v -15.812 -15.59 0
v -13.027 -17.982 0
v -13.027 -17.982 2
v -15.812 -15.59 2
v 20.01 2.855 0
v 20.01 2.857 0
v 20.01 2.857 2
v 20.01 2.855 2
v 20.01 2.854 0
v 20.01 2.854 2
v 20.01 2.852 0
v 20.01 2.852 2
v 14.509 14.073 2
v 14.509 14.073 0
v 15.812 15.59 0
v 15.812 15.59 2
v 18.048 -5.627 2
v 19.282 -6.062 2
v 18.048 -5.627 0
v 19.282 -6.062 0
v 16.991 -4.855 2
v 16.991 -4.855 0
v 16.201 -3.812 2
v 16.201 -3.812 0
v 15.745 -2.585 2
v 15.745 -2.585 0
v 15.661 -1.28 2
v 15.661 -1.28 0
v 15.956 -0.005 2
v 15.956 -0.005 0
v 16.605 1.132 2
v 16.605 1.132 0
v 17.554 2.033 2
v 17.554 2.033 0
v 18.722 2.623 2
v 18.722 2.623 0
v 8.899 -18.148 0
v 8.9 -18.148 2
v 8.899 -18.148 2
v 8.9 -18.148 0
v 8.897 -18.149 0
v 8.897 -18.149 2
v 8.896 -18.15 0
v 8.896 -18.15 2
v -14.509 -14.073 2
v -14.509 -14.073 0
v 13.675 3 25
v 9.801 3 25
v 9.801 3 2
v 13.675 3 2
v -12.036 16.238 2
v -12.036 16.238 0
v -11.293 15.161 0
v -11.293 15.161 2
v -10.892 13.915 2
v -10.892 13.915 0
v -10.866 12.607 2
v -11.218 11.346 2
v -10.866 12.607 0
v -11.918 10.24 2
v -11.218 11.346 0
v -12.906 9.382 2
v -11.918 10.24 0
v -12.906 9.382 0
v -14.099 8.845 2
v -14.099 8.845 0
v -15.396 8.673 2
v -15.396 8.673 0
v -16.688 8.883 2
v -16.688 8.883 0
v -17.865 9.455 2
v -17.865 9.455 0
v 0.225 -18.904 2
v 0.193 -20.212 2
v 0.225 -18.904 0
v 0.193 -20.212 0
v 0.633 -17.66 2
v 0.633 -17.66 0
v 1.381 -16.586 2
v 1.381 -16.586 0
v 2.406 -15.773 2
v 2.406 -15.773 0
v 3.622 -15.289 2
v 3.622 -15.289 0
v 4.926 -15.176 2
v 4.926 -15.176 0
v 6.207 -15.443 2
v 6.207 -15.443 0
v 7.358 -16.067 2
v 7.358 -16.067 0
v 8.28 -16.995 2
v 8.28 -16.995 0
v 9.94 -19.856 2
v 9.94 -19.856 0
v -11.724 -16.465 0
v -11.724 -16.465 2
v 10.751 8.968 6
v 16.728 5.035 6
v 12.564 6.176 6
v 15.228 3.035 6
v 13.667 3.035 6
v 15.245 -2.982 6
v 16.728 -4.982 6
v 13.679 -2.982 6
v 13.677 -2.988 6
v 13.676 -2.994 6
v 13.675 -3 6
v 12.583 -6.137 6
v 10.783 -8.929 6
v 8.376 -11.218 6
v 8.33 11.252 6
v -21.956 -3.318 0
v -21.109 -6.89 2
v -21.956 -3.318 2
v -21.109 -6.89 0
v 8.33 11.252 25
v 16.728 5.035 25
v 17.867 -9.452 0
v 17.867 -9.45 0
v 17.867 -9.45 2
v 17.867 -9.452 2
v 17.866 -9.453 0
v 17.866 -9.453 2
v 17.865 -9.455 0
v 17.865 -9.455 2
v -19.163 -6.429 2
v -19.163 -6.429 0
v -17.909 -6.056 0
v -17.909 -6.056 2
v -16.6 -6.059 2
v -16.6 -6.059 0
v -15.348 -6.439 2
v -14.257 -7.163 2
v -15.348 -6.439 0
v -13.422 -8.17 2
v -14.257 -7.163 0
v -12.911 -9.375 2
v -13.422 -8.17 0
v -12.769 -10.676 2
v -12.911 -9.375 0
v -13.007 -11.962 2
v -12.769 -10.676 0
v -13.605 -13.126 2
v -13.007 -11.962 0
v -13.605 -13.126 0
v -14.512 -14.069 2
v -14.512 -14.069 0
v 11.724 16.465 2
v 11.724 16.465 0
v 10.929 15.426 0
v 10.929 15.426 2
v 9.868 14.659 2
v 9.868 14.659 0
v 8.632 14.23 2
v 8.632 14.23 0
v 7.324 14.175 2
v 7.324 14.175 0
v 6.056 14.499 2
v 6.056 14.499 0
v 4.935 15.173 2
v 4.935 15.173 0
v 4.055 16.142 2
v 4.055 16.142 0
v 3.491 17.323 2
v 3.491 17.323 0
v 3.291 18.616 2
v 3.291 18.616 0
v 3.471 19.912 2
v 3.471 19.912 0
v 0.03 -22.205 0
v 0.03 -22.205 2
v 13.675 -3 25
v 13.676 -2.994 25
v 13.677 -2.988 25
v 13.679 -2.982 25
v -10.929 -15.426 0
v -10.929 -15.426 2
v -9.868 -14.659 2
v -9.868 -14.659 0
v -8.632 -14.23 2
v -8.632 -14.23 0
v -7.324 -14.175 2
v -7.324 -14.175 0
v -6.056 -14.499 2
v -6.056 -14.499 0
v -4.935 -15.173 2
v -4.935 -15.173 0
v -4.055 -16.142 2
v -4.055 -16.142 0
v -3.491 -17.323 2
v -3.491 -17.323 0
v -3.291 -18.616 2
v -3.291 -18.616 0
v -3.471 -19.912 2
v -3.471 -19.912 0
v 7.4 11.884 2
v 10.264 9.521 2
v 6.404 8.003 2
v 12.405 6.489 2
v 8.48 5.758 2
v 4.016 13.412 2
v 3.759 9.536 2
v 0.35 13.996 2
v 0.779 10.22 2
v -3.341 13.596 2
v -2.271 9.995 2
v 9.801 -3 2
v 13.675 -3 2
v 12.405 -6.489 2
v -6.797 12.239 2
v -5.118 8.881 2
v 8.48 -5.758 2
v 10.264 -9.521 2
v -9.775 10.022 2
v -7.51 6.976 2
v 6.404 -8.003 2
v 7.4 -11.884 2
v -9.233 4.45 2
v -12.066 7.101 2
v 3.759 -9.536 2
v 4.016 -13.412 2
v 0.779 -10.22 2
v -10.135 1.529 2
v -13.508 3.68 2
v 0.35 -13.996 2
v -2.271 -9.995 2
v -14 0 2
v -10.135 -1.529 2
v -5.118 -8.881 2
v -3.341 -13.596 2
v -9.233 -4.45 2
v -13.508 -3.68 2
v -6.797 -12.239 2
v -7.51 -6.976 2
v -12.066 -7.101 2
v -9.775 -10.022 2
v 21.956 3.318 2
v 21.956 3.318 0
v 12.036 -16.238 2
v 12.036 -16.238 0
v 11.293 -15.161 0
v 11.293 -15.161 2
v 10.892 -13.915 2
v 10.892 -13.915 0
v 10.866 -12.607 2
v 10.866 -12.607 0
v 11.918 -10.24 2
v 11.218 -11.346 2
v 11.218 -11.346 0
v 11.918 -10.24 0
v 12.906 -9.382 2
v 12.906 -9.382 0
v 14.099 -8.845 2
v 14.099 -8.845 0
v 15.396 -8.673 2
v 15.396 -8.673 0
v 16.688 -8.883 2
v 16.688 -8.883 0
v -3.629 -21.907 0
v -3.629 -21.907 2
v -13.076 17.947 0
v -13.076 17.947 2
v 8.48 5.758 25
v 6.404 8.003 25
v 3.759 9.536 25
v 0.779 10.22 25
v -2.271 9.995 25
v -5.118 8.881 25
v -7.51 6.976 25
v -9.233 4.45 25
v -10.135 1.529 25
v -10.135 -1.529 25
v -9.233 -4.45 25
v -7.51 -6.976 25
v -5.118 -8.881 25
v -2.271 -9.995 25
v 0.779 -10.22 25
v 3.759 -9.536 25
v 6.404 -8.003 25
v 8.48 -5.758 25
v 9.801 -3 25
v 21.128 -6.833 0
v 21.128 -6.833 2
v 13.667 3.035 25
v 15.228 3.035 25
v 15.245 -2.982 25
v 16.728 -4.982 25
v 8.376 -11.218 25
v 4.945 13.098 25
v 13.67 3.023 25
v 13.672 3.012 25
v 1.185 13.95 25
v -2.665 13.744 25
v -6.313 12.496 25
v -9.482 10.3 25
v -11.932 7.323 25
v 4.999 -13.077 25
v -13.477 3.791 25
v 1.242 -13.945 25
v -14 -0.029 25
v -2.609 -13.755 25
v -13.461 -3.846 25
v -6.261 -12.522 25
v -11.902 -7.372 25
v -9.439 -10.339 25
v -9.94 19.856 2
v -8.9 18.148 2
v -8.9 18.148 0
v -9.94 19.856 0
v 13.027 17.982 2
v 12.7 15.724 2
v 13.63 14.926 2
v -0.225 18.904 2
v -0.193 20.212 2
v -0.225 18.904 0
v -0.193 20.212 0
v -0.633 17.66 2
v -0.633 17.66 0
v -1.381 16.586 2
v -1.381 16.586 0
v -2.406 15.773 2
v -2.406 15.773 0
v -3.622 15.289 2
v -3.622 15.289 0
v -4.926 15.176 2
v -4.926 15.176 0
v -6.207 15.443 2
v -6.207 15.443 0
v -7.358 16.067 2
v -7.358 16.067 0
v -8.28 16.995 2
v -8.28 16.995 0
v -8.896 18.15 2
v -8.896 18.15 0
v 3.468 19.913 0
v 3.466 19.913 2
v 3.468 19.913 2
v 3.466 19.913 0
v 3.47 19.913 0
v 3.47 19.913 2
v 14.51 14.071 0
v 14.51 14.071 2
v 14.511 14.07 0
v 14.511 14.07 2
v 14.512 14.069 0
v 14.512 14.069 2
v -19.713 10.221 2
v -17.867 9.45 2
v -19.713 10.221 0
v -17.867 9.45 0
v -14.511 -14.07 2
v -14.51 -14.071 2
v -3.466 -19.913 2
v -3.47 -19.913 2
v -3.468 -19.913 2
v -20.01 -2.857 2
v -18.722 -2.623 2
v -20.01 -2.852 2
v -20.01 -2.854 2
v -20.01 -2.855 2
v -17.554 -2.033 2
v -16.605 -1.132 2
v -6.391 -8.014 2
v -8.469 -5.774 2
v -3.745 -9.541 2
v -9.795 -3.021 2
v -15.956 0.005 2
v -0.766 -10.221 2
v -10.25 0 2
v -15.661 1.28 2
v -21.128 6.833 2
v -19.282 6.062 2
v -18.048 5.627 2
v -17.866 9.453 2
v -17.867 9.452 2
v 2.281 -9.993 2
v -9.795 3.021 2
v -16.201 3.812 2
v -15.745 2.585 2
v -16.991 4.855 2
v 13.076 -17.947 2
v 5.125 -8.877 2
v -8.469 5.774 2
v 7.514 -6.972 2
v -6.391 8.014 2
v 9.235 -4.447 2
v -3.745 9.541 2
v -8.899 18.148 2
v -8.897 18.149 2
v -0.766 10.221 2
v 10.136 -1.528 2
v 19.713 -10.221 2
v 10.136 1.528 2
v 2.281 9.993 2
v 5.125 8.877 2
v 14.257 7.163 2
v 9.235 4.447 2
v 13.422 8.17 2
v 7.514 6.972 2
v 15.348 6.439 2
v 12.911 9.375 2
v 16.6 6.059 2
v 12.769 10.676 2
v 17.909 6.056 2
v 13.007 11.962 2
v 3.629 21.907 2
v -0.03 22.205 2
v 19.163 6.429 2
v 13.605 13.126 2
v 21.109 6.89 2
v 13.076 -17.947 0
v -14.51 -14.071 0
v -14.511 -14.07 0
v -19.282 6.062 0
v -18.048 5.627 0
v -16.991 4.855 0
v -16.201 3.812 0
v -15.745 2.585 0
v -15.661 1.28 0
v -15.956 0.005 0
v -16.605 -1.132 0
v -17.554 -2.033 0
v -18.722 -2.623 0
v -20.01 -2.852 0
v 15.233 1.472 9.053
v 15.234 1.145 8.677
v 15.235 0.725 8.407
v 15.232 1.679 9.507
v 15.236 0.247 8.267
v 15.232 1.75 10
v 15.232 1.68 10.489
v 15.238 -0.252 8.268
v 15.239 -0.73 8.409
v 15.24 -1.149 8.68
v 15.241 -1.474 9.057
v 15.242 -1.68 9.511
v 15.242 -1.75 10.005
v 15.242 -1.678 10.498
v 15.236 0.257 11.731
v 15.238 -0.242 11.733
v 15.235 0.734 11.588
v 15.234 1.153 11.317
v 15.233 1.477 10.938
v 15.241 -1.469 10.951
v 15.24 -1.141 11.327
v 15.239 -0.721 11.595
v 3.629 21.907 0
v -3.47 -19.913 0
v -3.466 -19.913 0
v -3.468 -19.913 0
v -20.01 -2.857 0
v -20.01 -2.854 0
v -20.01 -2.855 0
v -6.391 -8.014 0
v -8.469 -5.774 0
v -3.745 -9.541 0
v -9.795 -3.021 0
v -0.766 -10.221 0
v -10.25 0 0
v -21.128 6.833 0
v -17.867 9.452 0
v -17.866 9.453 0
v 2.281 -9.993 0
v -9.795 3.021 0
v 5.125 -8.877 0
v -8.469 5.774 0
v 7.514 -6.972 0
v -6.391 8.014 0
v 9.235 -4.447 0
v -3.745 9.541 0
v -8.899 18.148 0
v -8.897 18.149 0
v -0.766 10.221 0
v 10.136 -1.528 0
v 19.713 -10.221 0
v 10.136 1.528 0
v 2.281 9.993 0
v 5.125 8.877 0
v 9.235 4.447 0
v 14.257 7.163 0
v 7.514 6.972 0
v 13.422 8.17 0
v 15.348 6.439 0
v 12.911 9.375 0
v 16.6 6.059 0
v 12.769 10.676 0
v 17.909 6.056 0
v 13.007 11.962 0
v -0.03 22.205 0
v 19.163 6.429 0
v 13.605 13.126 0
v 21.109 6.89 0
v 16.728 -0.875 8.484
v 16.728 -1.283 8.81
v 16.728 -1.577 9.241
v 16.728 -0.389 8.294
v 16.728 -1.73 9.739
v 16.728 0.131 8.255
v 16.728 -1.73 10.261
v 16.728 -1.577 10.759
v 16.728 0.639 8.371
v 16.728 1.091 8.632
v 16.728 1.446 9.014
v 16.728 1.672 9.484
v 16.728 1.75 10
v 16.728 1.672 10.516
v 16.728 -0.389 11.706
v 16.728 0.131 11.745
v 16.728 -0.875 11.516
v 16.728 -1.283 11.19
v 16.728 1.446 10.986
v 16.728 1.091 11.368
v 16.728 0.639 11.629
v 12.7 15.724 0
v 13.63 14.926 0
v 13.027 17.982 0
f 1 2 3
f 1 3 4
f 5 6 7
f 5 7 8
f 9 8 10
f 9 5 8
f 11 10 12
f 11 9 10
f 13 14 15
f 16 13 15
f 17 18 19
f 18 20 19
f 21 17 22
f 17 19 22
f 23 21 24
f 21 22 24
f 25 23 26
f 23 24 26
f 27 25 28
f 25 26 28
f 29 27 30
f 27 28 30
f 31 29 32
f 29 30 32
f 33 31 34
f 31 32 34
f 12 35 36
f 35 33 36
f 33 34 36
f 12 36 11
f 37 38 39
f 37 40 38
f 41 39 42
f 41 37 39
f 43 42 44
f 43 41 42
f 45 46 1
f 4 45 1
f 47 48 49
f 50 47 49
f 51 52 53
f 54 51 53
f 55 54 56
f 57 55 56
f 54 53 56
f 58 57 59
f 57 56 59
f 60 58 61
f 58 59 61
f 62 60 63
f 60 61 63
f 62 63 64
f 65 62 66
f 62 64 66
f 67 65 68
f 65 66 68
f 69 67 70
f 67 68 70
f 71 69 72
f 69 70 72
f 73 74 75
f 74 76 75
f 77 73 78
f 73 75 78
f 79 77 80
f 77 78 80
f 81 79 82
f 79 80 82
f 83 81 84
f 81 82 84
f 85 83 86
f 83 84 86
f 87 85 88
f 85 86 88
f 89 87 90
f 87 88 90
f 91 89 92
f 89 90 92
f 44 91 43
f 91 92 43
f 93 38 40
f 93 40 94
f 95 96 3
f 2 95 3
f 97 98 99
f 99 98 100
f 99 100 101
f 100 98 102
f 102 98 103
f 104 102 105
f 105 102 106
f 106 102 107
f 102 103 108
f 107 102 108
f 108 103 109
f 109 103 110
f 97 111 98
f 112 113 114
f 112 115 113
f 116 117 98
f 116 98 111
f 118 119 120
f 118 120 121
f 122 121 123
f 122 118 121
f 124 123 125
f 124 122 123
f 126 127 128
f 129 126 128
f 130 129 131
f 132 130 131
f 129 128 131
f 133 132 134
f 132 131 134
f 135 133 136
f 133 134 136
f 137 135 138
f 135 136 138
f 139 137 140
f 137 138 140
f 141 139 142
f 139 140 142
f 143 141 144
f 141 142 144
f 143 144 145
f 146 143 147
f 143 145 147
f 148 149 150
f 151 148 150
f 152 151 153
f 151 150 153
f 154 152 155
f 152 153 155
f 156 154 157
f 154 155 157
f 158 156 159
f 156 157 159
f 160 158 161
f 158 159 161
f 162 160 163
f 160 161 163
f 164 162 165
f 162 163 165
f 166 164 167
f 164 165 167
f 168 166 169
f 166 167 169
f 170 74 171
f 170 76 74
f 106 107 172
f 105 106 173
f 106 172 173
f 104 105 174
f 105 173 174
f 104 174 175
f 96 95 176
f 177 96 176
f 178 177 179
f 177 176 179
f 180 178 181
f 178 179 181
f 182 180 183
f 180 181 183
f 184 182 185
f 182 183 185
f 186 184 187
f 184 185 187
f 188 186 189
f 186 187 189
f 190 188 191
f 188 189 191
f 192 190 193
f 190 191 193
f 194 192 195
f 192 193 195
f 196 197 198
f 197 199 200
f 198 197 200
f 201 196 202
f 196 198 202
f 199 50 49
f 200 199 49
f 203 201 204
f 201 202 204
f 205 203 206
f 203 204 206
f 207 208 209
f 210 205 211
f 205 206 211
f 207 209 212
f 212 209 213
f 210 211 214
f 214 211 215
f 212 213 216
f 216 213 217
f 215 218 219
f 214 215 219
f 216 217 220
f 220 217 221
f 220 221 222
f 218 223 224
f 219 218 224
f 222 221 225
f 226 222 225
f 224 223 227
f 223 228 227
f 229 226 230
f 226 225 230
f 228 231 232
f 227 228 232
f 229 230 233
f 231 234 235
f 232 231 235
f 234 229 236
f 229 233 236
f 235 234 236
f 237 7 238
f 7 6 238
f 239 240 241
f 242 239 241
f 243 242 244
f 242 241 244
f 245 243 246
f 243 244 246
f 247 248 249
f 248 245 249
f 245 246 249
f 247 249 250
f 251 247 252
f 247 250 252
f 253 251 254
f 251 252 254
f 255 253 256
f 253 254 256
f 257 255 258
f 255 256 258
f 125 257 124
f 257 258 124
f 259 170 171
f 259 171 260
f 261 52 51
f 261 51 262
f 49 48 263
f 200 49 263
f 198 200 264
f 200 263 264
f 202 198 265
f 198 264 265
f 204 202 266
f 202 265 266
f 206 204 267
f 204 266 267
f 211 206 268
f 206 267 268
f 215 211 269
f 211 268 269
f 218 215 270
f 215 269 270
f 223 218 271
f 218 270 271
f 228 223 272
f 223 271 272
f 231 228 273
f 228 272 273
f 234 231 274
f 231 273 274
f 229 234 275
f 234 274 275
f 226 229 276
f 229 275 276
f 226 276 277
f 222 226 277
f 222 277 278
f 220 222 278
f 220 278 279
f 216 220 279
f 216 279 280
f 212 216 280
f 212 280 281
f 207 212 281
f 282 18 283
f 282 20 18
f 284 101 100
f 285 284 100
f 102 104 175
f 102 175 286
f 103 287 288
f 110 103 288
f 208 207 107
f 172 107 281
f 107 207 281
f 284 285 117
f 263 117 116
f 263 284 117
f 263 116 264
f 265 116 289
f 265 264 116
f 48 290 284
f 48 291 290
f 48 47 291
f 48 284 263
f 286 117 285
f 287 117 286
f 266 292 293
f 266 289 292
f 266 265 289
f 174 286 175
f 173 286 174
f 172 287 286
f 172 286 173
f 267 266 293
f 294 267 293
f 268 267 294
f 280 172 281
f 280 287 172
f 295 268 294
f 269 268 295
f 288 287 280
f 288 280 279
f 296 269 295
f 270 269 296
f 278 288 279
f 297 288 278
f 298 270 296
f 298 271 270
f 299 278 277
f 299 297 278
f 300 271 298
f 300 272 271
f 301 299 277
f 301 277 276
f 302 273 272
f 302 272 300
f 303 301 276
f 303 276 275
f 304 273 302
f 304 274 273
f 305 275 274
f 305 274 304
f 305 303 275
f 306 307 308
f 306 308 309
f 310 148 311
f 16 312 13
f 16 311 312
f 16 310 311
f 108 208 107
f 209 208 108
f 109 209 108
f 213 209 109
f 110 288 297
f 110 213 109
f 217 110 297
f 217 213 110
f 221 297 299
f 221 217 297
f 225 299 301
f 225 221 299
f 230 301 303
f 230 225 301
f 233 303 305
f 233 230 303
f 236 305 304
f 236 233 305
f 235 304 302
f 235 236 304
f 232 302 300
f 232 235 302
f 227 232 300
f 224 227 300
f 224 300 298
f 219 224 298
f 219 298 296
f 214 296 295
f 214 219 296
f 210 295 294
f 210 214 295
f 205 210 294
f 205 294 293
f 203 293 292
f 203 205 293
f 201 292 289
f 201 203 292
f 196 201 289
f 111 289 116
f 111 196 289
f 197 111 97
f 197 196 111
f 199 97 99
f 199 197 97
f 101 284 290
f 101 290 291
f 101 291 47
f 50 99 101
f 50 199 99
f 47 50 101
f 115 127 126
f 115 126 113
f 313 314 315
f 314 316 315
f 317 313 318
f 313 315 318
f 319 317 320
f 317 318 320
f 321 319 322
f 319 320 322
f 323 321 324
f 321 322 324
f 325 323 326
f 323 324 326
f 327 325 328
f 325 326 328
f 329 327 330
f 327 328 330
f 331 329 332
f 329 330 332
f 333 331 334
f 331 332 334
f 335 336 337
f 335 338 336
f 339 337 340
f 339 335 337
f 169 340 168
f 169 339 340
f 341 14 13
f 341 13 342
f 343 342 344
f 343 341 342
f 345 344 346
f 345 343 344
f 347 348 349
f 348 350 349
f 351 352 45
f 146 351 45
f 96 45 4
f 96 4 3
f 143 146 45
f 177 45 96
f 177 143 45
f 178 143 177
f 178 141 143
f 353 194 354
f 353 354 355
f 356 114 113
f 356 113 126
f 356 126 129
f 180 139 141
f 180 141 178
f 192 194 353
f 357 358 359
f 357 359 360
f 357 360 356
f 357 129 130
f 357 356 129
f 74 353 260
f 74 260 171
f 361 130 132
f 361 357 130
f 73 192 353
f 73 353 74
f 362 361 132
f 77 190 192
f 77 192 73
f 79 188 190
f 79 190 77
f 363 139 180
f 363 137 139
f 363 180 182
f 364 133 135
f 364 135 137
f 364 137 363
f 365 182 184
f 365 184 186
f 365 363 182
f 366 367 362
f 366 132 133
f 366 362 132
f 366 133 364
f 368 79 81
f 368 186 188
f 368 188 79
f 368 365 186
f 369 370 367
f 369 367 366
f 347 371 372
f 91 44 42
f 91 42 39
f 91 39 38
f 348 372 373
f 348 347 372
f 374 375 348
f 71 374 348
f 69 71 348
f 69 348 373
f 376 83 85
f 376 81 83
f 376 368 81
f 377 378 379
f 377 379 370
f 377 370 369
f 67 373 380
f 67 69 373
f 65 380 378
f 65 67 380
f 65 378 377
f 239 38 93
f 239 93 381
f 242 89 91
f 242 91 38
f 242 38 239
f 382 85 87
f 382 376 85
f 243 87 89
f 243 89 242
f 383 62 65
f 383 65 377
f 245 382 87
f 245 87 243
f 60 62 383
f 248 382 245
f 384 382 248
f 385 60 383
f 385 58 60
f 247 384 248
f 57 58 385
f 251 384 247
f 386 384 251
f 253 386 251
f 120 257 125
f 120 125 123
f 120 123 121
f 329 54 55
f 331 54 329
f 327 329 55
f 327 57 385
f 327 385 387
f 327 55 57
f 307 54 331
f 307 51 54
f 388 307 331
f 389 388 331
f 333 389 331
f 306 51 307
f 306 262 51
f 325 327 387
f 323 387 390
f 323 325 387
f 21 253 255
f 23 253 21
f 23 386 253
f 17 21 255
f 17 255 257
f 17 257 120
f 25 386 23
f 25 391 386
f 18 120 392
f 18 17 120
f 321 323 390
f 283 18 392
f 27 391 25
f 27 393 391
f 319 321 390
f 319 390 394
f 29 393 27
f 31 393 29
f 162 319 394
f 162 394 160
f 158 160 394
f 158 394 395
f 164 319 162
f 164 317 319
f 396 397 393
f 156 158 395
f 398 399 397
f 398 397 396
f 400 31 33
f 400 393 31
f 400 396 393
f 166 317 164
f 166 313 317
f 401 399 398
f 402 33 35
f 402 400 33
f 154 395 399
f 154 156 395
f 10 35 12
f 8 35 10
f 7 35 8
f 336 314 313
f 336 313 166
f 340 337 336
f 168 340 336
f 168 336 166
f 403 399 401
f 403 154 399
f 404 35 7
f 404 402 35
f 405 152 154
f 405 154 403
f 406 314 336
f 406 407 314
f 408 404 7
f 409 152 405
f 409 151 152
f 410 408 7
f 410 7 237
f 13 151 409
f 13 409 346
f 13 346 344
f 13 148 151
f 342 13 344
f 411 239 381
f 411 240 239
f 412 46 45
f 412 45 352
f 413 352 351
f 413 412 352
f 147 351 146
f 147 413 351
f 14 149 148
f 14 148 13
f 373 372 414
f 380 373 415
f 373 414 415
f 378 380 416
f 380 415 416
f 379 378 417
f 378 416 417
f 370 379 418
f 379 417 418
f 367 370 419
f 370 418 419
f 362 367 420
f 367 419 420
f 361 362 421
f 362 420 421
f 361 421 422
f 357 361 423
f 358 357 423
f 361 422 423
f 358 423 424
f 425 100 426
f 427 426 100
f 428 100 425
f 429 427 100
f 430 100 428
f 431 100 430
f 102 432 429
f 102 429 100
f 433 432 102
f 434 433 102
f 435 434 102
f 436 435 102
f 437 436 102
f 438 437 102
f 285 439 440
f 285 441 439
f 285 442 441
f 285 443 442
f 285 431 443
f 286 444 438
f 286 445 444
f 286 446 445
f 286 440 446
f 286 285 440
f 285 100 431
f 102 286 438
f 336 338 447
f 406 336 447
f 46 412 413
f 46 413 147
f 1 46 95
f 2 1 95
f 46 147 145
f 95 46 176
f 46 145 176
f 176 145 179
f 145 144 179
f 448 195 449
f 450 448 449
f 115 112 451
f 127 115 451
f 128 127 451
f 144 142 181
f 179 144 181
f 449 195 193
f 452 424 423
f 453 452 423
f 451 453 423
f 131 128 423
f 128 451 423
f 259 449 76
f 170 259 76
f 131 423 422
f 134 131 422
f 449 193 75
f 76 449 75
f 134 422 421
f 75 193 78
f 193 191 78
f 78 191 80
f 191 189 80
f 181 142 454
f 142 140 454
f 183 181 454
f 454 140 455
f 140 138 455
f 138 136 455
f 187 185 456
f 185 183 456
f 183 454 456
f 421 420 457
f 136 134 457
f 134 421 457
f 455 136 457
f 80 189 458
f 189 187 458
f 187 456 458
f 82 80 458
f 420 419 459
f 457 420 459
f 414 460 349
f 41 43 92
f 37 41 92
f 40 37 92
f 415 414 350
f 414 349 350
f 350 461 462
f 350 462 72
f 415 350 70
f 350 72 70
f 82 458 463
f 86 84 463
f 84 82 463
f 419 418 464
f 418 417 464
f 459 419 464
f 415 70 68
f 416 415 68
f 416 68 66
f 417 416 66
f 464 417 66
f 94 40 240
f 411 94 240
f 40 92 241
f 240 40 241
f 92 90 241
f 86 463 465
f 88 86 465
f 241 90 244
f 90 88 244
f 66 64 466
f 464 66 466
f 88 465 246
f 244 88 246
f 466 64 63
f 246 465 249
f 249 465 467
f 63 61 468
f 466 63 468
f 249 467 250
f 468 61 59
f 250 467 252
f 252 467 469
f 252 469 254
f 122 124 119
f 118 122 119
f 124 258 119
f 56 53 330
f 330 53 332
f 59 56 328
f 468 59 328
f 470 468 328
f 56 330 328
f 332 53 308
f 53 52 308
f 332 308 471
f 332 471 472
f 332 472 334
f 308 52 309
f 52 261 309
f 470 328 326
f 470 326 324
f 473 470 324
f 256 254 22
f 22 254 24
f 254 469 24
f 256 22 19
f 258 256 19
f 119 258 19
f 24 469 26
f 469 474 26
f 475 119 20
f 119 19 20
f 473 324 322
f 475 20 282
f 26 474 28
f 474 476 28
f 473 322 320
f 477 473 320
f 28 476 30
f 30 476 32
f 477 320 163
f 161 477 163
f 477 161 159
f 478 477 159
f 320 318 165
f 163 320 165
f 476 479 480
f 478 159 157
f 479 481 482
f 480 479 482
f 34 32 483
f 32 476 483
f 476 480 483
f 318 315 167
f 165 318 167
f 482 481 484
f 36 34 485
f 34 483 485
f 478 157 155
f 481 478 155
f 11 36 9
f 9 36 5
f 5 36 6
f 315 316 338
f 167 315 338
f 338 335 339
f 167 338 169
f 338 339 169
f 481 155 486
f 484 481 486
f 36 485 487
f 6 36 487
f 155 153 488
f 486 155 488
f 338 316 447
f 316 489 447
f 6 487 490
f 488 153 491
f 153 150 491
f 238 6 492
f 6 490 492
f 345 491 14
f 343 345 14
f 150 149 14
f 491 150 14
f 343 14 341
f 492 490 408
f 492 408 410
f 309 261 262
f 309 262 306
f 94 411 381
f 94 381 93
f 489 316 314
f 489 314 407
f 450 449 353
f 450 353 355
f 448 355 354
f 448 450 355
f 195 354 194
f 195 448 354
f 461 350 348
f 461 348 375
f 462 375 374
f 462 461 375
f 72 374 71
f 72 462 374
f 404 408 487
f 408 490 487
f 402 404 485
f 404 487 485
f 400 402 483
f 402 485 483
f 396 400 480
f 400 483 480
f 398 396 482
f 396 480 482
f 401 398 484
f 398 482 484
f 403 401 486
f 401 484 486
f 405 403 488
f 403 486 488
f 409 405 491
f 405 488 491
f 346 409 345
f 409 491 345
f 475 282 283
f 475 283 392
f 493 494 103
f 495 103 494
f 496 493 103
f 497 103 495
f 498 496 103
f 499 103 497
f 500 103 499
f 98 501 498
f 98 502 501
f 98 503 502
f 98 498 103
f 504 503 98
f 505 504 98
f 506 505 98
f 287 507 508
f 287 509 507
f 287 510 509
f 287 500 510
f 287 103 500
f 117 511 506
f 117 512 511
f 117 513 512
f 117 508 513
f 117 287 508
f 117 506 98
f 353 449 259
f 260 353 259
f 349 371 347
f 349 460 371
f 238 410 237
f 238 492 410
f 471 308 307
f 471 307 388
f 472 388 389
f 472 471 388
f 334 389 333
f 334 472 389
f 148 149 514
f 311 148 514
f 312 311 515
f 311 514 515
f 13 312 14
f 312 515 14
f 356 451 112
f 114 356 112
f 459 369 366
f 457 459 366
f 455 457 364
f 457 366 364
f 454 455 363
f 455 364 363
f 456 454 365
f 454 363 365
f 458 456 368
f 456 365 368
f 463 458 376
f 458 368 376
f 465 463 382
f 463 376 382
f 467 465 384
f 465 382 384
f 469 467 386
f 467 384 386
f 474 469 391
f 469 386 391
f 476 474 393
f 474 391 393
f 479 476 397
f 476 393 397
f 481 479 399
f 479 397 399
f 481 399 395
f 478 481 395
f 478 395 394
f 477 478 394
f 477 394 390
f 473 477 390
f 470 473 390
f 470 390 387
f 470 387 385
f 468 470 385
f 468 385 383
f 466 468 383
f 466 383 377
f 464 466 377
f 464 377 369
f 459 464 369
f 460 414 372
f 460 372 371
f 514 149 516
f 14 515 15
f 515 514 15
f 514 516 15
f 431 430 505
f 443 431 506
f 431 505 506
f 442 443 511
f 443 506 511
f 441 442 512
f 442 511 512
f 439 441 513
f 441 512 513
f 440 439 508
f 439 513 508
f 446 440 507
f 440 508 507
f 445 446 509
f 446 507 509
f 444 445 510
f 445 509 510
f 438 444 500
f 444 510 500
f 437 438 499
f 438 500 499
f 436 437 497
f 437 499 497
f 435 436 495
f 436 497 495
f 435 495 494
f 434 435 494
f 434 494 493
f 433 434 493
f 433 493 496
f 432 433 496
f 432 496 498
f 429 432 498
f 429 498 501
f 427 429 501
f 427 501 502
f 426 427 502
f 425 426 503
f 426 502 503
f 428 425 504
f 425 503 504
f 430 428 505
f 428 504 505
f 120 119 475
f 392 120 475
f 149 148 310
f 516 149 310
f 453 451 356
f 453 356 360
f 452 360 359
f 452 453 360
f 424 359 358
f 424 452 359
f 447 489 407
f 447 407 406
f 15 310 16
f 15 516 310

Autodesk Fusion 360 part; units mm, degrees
sketch "Sketch1" plane through (0, 0, 0) normal (0, 0, 1) x (1, 0, 0)
  circle A0 centre (0, 0) radius 20.2127
  circle A1 centre (7.7908, 18.6509) radius 4.5
  line L0 (11.7242, 16.465) -> (14.5091, 14.0726)
  line L1 (14.5091, 14.0726) -> (15.8123, 15.5897)
  line L2 (11.7242, 16.465) -> (13.0274, 17.9821)
  line L3 (13.0274, 17.9821) -> (15.8123, 15.5897)
  circle A2 centre (-4.6599, 19.6682) radius 4.5
  circle A3 centre (0, 0) radius 20.2127
  circle A4 centre (-15.3306, 13.1729) radius 4.5
  circle A5 centre (0, 0) radius 20.2127
  circle A6 centre (-20.1456, 1.646) radius 4.5
  circle A7 centre (0, 0) radius 20.2127
  circle A8 centre (-17.2656, -10.5096) radius 4.5
  circle A9 centre (0, 0) radius 20.2127
  circle A10 centre (-7.7908, -18.6509) radius 4.5
  circle A11 centre (0, 0) radius 20.2127
  circle A12 centre (4.6599, -19.6682) radius 4.5
  circle A13 centre (0, 0) radius 20.2127
  circle A14 centre (15.3306, -13.1729) radius 4.5
  circle A15 centre (0, 0) radius 20.2127
  circle A16 centre (20.1456, -1.646) radius 4.5
  circle A17 centre (0, 0) radius 20.2127
  circle A18 centre (17.2656, 10.5096) radius 4.5
  circle A19 centre (0, 0) radius 20.2127
  line L4 (-0.1928, 20.2118) -> (-0.0302, 22.2052)
  line L5 (-0.0302, 22.2052) -> (3.629, 21.9066)
  line L6 (3.4664, 19.9132) -> (3.629, 21.9066)
  circle A20 centre (0, 0) radius 20.2127
  line L7 (-12.0362, 16.2383) -> (-13.0763, 17.9466)
  line L8 (-13.0763, 17.9466) -> (-9.9404, 19.8559)
  line L9 (-8.9003, 18.1477) -> (-9.9404, 19.8559)
  circle A21 centre (0, 0) radius 20.2127
  line L10 (-19.2821, 6.0624) -> (-21.1277, 6.8331)
  line L11 (-21.1277, 6.8331) -> (-19.713, 10.2209)
  line L12 (-17.8674, 9.4503) -> (-19.713, 10.2209)
  circle A22 centre (0, 0) radius 20.2127
  line L13 (-19.163, -6.4292) -> (-21.109, -6.8905)
  line L14 (-21.109, -6.8905) -> (-21.9559, -3.3181)
  line L15 (-20.0098, -2.8568) -> (-21.9559, -3.3181)
  circle A23 centre (0, 0) radius 20.2127
  line L16 (-11.7242, -16.465) -> (-13.0274, -17.9821)
  line L17 (-13.0274, -17.9821) -> (-15.8123, -15.5897)
  line L18 (-14.5091, -14.0726) -> (-15.8123, -15.5897)
  circle A24 centre (0, 0) radius 20.2127
  line L19 (0.1928, -20.2118) -> (0.0302, -22.2052)
  line L20 (0.0302, -22.2052) -> (-3.629, -21.9066)
  line L21 (-3.4664, -19.9132) -> (-3.629, -21.9066)
  circle A25 centre (0, 0) radius 20.2127
  line L22 (12.0362, -16.2383) -> (13.0763, -17.9466)
  line L23 (13.0763, -17.9466) -> (9.9404, -19.8559)
  line L24 (8.9003, -18.1477) -> (9.9404, -19.8559)
  circle A26 centre (0, 0) radius 20.2127
  line L25 (19.2821, -6.0624) -> (21.1277, -6.8331)
  line L26 (21.1277, -6.8331) -> (19.713, -10.2209)
  line L27 (17.8674, -9.4503) -> (19.713, -10.2209)
  circle A27 centre (0, 0) radius 20.2127
  line L28 (19.163, 6.4292) -> (21.109, 6.8905)
  line L29 (21.109, 6.8905) -> (21.9559, 3.3181)
  line L30 (20.0098, 2.8568) -> (21.9559, 3.3181)
  circle A28 centre (0, 0) radius 20.2127
  dimension "d1" = 40.4254
  dimension "d2" = 9
  dimension "d11" = 2
  dimension "d12" = 2
  dimension "d14" = 360
  dimension "d16" = 360
extrude "Extrude1" add sketch "Sketch1" along normal blind 2 contours A0 A1 L0 A2 A3 A4 A5 A6 A7 A8 A9 A10 A11 A12 A13 A14 A15 A16 A17 A18 A19 A20 A21 A22 A23 A24 A25 A26 A27 A28 | A0 A3 A5 A7 A9 A11 A13 A15 A17 A19 A20 A21 A22 A23 A24 A25 A26 A27 L28 L29 L30 A28 | A0 A3 A5 A7 A9 A11 A13 A15 A17 A19 A20 A21 A22 A23 A24 A25 A26 L25 L26 L27 A27 A28 | A0 L1 L2 L3 A3 A5 A7 A9 A11 A13 A15 A17 A19 A20 A21 A22 A23 A24 A25 A26 A27 A28 | A0 A3 A5 A7 A9 A11 A13 A15 A17 A19 A20 A21 A22 A23 A24 A25 L22 L23 L24 A26 A27 A28 | A0 A3 A5 A7 A9 A11 A13 A15 A17 A19 L4 L5 L6 A20 A21 A22 A23 A24 A25 A26 A27 A28 | A0 A3 A5 A7 A9 A11 A13 A15 A17 A19 A20 A21 A22 A23 A24 L19 L20 L21 A25 A26 A27 A28 | A0 A3 A5 A7 A9 A11 A13 A15 A17 A19 A20 L7 L8 L9 A21 A22 A23 A24 A25 A26 A27 A28 | A0 A3 A5 A7 A9 A11 A13 A15 A17 A19 A20 A21 A22 A23 L16 L17 L18 A24 A25 A26 A27 A28 | A0 A3 A5 A7 A9 A11 A13 A15 A17 A19 A20 A21 L10 L11 L12 A22 A23 A24 A25 A26 A27 A28 | A0 A3 A5 A7 A9 A11 A13 A15 A17 A19 A20 A21 A22 L13 L14 L15 A23 A24 A25 A26 A27 A28 makes body 1 at (-1.9939, 0.1629, 0)
sketch "Sketch14" plane through (0, 0, 2) normal (0, 0, 1) x (-1, 0, 0)
  arc A0 (-20.0105, -2.852) -> (-20.0098, -2.8568) centre (0, 0) ccw
  line L0 (-20.0098, -2.8568) -> (-21.9559, -3.3181)
  line L1 (-21.9559, -3.3181) -> (-21.109, -6.8905)
  line L2 (-21.109, -6.8905) -> (-19.163, -6.4292)
  arc A1 (-14.5125, -14.0692) -> (-19.163, -6.4292) centre (-17.2656, -10.5096) ccw
  arc A2 (-14.5125, -14.0692) -> (-14.5091, -14.0726) centre (0, 0) ccw
  line L3 (-14.5091, -14.0726) -> (-11.7242, -16.465)
  arc A3 (-3.4712, -19.9124) -> (-11.7242, -16.465) centre (-7.7908, -18.6509) ccw
  arc A4 (-3.4712, -19.9124) -> (-3.4664, -19.9132) centre (0, 0) ccw
  line L4 (-3.4664, -19.9132) -> (-3.629, -21.9066)
  line L5 (-3.629, -21.9066) -> (0.0302, -22.2052)
  line L6 (0.0302, -22.2052) -> (0.1928, -20.2118)
  arc A5 (8.896, -18.1498) -> (0.1928, -20.2118) centre (4.6599, -19.6682) ccw
  arc A6 (8.896, -18.1498) -> (8.9003, -18.1477) centre (0, 0) ccw
  line L7 (8.9003, -18.1477) -> (9.9404, -19.8559)
  line L8 (9.9404, -19.8559) -> (13.0763, -17.9466)
  line L9 (13.0763, -17.9466) -> (12.0362, -16.2383)
  arc A7 (17.8652, -9.4546) -> (12.0362, -16.2383) centre (15.3306, -13.1729) ccw
  arc A8 (17.8652, -9.4546) -> (17.8674, -9.4503) centre (0, 0) ccw
  line L10 (17.8674, -9.4503) -> (19.713, -10.2209)
  line L11 (19.713, -10.2209) -> (21.1277, -6.8331)
  line L12 (21.1277, -6.8331) -> (19.2821, -6.0624)
  arc A9 (20.0105, 2.852) -> (19.2821, -6.0624) centre (20.1456, -1.646) ccw
  arc A10 (20.0105, 2.852) -> (20.0098, 2.8568) centre (0, 0) ccw
  line L13 (20.0098, 2.8568) -> (21.9559, 3.3181)
  line L14 (21.9559, 3.3181) -> (21.109, 6.8905)
  line L15 (21.109, 6.8905) -> (19.163, 6.4292)
  arc A11 (14.5125, 14.0692) -> (19.163, 6.4292) centre (17.2656, 10.5096) ccw
  arc A12 (14.5125, 14.0692) -> (14.5091, 14.0726) centre (0, 0) ccw
  line L16 (14.5091, 14.0726) -> (15.8123, 15.5897)
  line L17 (15.8123, 15.5897) -> (13.0274, 17.9821)
  line L18 (13.0274, 17.9821) -> (11.7242, 16.465)
  arc A13 (3.4712, 19.9124) -> (11.7242, 16.465) centre (7.7908, 18.6509) ccw
  arc A14 (3.4712, 19.9124) -> (3.4664, 19.9132) centre (0, 0) ccw
  line L19 (3.4664, 19.9132) -> (3.629, 21.9066)
  line L20 (3.629, 21.9066) -> (-0.0302, 22.2052)
  line L21 (-0.0302, 22.2052) -> (-0.1928, 20.2118)
  arc A15 (-8.896, 18.1498) -> (-0.1928, 20.2118) centre (-4.6599, 19.6682) ccw
  arc A16 (-8.896, 18.1498) -> (-8.9003, 18.1477) centre (0, 0) ccw
  line L22 (-8.9003, 18.1477) -> (-9.9404, 19.8559)
  line L23 (-9.9404, 19.8559) -> (-13.0763, 17.9466)
  line L24 (-13.0763, 17.9466) -> (-12.0362, 16.2383)
  arc A17 (-17.8652, 9.4546) -> (-12.0362, 16.2383) centre (-15.3306, 13.1729) ccw
  arc A18 (-17.8652, 9.4546) -> (-17.8674, 9.4503) centre (0, 0) ccw
  line L25 (-17.8674, 9.4503) -> (-19.713, 10.2209)
  line L26 (-19.713, 10.2209) -> (-21.1277, 6.8331)
  line L27 (-21.1277, 6.8331) -> (-19.2821, 6.0624)
  arc A19 (-20.0105, -2.852) -> (-19.2821, 6.0624) centre (-20.1456, 1.646) ccw
  circle A20 centre (-7, 0) radius 2
  circle A21 centre (7, 0) radius 2
  dimension "d57" = 4
extrude "Extrude12" cut sketch "Sketch14" against normal blind 3 contours A20 | A21 bodies 1
sketch "Sketch4" plane through (0, 0, 2) normal (0, 0, 1) x (-1, 0, 0)
  arc A0 (-20.0105, -2.852) -> (-20.0098, -2.8568) centre (0, 0) ccw
  line L0 (-20.0098, -2.8568) -> (-21.9559, -3.3181)
  line L1 (-21.9559, -3.3181) -> (-21.109, -6.8905)
  line L2 (-21.109, -6.8905) -> (-19.163, -6.4292)
  arc A1 (-14.5125, -14.0692) -> (-19.163, -6.4292) centre (-17.2656, -10.5096) ccw
  arc A2 (-14.5125, -14.0692) -> (-14.5091, -14.0726) centre (0, 0) ccw
  line L3 (-14.5091, -14.0726) -> (-11.7242, -16.465)
  arc A3 (-3.4712, -19.9124) -> (-11.7242, -16.465) centre (-7.7908, -18.6509) ccw
  arc A4 (-3.4712, -19.9124) -> (-3.4664, -19.9132) centre (0, 0) ccw
  line L4 (-3.4664, -19.9132) -> (-3.629, -21.9066)
  line L5 (-3.629, -21.9066) -> (0.0302, -22.2052)
  line L6 (0.0302, -22.2052) -> (0.1928, -20.2118)
  arc A5 (8.896, -18.1498) -> (0.1928, -20.2118) centre (4.6599, -19.6682) ccw
  arc A6 (8.896, -18.1498) -> (8.9003, -18.1477) centre (0, 0) ccw
  line L7 (8.9003, -18.1477) -> (9.9404, -19.8559)
  line L8 (9.9404, -19.8559) -> (13.0763, -17.9466)
  line L9 (13.0763, -17.9466) -> (12.0362, -16.2383)
  arc A7 (17.8652, -9.4546) -> (12.0362, -16.2383) centre (15.3306, -13.1729) ccw
  arc A8 (17.8652, -9.4546) -> (17.8674, -9.4503) centre (0, 0) ccw
  line L10 (17.8674, -9.4503) -> (19.713, -10.2209)
  line L11 (19.713, -10.2209) -> (21.1277, -6.8331)
  line L12 (21.1277, -6.8331) -> (19.2821, -6.0624)
  arc A9 (20.0105, 2.852) -> (19.2821, -6.0624) centre (20.1456, -1.646) ccw
  arc A10 (20.0105, 2.852) -> (20.0098, 2.8568) centre (0, 0) ccw
  line L13 (20.0098, 2.8568) -> (21.9559, 3.3181)
  line L14 (21.9559, 3.3181) -> (21.109, 6.8905)
  line L15 (21.109, 6.8905) -> (19.163, 6.4292)
  arc A11 (14.5125, 14.0692) -> (19.163, 6.4292) centre (17.2656, 10.5096) ccw
  arc A12 (14.5125, 14.0692) -> (14.5091, 14.0726) centre (0, 0) ccw
  line L16 (14.5091, 14.0726) -> (15.8123, 15.5897)
  line L17 (15.8123, 15.5897) -> (13.0274, 17.9821)
  line L18 (13.0274, 17.9821) -> (11.7242, 16.465)
  arc A13 (3.4712, 19.9124) -> (11.7242, 16.465) centre (7.7908, 18.6509) ccw
  arc A14 (3.4712, 19.9124) -> (3.4664, 19.9132) centre (0, 0) ccw
  line L19 (3.4664, 19.9132) -> (3.629, 21.9066)
  line L20 (3.629, 21.9066) -> (-0.0302, 22.2052)
  line L21 (-0.0302, 22.2052) -> (-0.1928, 20.2118)
  arc A15 (-8.896, 18.1498) -> (-0.1928, 20.2118) centre (-4.6599, 19.6682) ccw
  arc A16 (-8.896, 18.1498) -> (-8.9003, 18.1477) centre (0, 0) ccw
  line L22 (-8.9003, 18.1477) -> (-9.9404, 19.8559)
  line L23 (-9.9404, 19.8559) -> (-13.0763, 17.9466)
  line L24 (-13.0763, 17.9466) -> (-12.0362, 16.2383)
  arc A17 (-17.8652, 9.4546) -> (-12.0362, 16.2383) centre (-15.3306, 13.1729) ccw
  arc A18 (-17.8652, 9.4546) -> (-17.8674, 9.4503) centre (0, 0) ccw
  line L25 (-17.8674, 9.4503) -> (-19.713, 10.2209)
  line L26 (-19.713, 10.2209) -> (-21.1277, 6.8331)
  line L27 (-21.1277, 6.8331) -> (-19.2821, 6.0624)
  arc A19 (-20.0105, -2.852) -> (-19.2821, 6.0624) centre (-20.1456, 1.646) ccw
  circle A20 centre (0, 0) radius 10
  circle A21 centre (7, 0) radius 2
  circle A22 centre (-7, 0) radius 2
  dimension "d23" = 20
sketch "Sketch5" plane through (0, 0, 2) normal (0, 0, 1) x (-1, 0, 0)
extrude "Extrude4" cut sketch "Sketch4" against normal blind 2 contours A20 | A21 | A22 bodies 1
sketch "Sketch8" plane through (0, 0, 2) normal (0, 0, 1) x (-1, 0, 0)
  circle A0 centre (0, 0) radius 10
  arc A1 (-20.0105, -2.852) -> (-20.0098, -2.8568) centre (0, 0) ccw
  line L0 (-20.0098, -2.8568) -> (-21.9559, -3.3181)
  line L1 (-21.9559, -3.3181) -> (-21.109, -6.8905)
  line L2 (-21.109, -6.8905) -> (-19.163, -6.4292)
  arc A2 (-14.5125, -14.0692) -> (-19.163, -6.4292) centre (-17.2656, -10.5096) ccw
  arc A3 (-14.5125, -14.0692) -> (-14.5091, -14.0726) centre (0, 0) ccw
  line L3 (-14.5091, -14.0726) -> (-11.7242, -16.465)
  arc A4 (-3.4712, -19.9124) -> (-11.7242, -16.465) centre (-7.7908, -18.6509) ccw
  arc A5 (-3.4712, -19.9124) -> (-3.4664, -19.9132) centre (0, 0) ccw
  line L4 (-3.4664, -19.9132) -> (-3.629, -21.9066)
  line L5 (-3.629, -21.9066) -> (0.0302, -22.2052)
  line L6 (0.0302, -22.2052) -> (0.1928, -20.2118)
  arc A6 (8.896, -18.1498) -> (0.1928, -20.2118) centre (4.6599, -19.6682) ccw
  arc A7 (8.896, -18.1498) -> (8.9003, -18.1477) centre (0, 0) ccw
  line L7 (8.9003, -18.1477) -> (9.9404, -19.8559)
  line L8 (9.9404, -19.8559) -> (13.0763, -17.9466)
  line L9 (13.0763, -17.9466) -> (12.0362, -16.2383)
  arc A8 (17.8652, -9.4546) -> (12.0362, -16.2383) centre (15.3306, -13.1729) ccw
  arc A9 (17.8652, -9.4546) -> (17.8674, -9.4503) centre (0, 0) ccw
  line L10 (17.8674, -9.4503) -> (19.713, -10.2209)
  line L11 (19.713, -10.2209) -> (21.1277, -6.8331)
  line L12 (21.1277, -6.8331) -> (19.2821, -6.0624)
  arc A10 (20.0105, 2.852) -> (19.2821, -6.0624) centre (20.1456, -1.646) ccw
  arc A11 (20.0105, 2.852) -> (20.0098, 2.8568) centre (0, 0) ccw
  line L13 (20.0098, 2.8568) -> (21.9559, 3.3181)
  line L14 (21.9559, 3.3181) -> (21.109, 6.8905)
  line L15 (21.109, 6.8905) -> (19.163, 6.4292)
  arc A12 (14.5125, 14.0692) -> (19.163, 6.4292) centre (17.2656, 10.5096) ccw
  arc A13 (14.5125, 14.0692) -> (14.5091, 14.0726) centre (0, 0) ccw
  line L16 (14.5091, 14.0726) -> (15.8123, 15.5897)
  line L17 (15.8123, 15.5897) -> (13.0274, 17.9821)
  line L18 (13.0274, 17.9821) -> (11.7242, 16.465)
  arc A14 (3.4712, 19.9124) -> (11.7242, 16.465) centre (7.7908, 18.6509) ccw
  arc A15 (3.4712, 19.9124) -> (3.4664, 19.9132) centre (0, 0) ccw
  line L19 (3.4664, 19.9132) -> (3.629, 21.9066)
  line L20 (3.629, 21.9066) -> (-0.0302, 22.2052)
  line L21 (-0.0302, 22.2052) -> (-0.1928, 20.2118)
  arc A16 (-8.896, 18.1498) -> (-0.1928, 20.2118) centre (-4.6599, 19.6682) ccw
  arc A17 (-8.896, 18.1498) -> (-8.9003, 18.1477) centre (0, 0) ccw
  line L22 (-8.9003, 18.1477) -> (-9.9404, 19.8559)
  line L23 (-9.9404, 19.8559) -> (-13.0763, 17.9466)
  line L24 (-13.0763, 17.9466) -> (-12.0362, 16.2383)
  arc A18 (-17.8652, 9.4546) -> (-12.0362, 16.2383) centre (-15.3306, 13.1729) ccw
  arc A19 (-17.8652, 9.4546) -> (-17.8674, 9.4503) centre (0, 0) ccw
  line L25 (-17.8674, 9.4503) -> (-19.713, 10.2209)
  line L26 (-19.713, 10.2209) -> (-21.1277, 6.8331)
  line L27 (-21.1277, 6.8331) -> (-19.2821, 6.0624)
  arc A20 (-20.0105, -2.852) -> (-19.2821, 6.0624) centre (-20.1456, 1.646) ccw
  circle A21 centre (0, 0) radius 14
extrude "Extrude7" add sketch "Sketch8" along normal blind 23 separate body contours A21 makes body 2
sketch "Sketch9" plane through (0, 0, 0) normal (1, 0, 0) x (0, 1, 0)
  line L0 (0, 1.8522) -> (0, 25.8522)
  line L1 (-3, 25.7045) -> (3, 25.7045)
  line L2 (3, 25.7045) -> (3, 2)
  line L3 (3, 2) -> (-3, 2)
  line L4 (-3, 2) -> (-3, 25.7045)
  line L5 (-3, 25.7045) -> (3, 2) construction
  line L6 (3, 25.7045) -> (-3, 2) construction
  point P0 (0, 13.8522)
  dimension "d35" = 24
  dimension "d36" = 6
extrude "Extrude8" cut sketch "Sketch9" along normal blind 20 bodies 2
sketch "Sketch10" plane through (0, 0, 25) normal (0, 0, 1) x (-1, 0, 0)
  line L0 (-13.6748, 3) -> (-9.5394, 3)
  arc A0 (-9.5394, -3) -> (-9.5394, 3) centre (0, 0) ccw
  line L1 (-9.5394, -3) -> (-13.6748, -3)
  arc A1 (-13.6748, -3) -> (-13.6748, 3) centre (0, 0) ccw
sketch "Sketch11" plane through (0, 0, 25) normal (0, 0, 1) x (-1, 0, 0)
  circle A0 centre (0, 0) radius 10
  circle A1 centre (0, 0) radius 14
  line L0 (-9.5452, 2.9816) -> (-15.2452, 2.9816)
  line L1 (-9.5283, -3.0351) -> (-15.2283, -3.0351)
  line L2 (-15.2283, -3.0351) -> (-15.2452, 2.9816)
  line L3 (-9.5283, -3.0351) -> (-9.5283, -5.0351)
  line L4 (-9.5283, -5.0351) -> (-13.0632, -5.0351)
  line L5 (-16.7283, -4.358) -> (-16.7283, -5.0351)
  line L6 (-16.7283, -5.0351) -> (-13.0632, -5.0351)
  line L7 (-9.5452, 2.9816) -> (-9.5452, 4.9816)
  line L8 (-9.5452, 4.9816) -> (-13.0837, 4.9816)
  line L9 (-13.0837, 4.9816) -> (-16.7283, 4.9816)
  line L10 (-16.7283, 4.9816) -> (-16.7283, -4.358)
  line L11 (-16.7283, 4.9816) -> (-8.3761, 11.2179)
  line L12 (-16.7283, -5.0351) -> (-8.3298, -11.2523)
  dimension "d39" = 28
  dimension "d41" = 5.7
  dimension "d42" = 5.7
  dimension "d43" = 2
  dimension "d45" = 2
  dimension "d56" = 1.5
extrude "Extrude9" add sketch "Sketch11" against normal blind 19 contours A1 L0 L1 L2 L5 L6 L9 L10 | A1 L9 L11 | A1 L6 L12 bodies 2
sketch "Sketch12" plane through (16.7283, 0, 0) normal (1, 0, 0) x (0, 1, 0)
  line L0 (5.0351, 25) -> (-4.9816, 25)
  line L1 (-4.9816, 6) -> (5.0351, 6)
  circle A0 centre (0, 10) radius 1.75
  line L2 (14, 2) -> (-14, 2)
  line L3 (-4.9816, 25) -> (-4.9816, 6)
  line L4 (5.0351, 6) -> (5.0351, 25)
  dimension "d48" = 3.5
  dimension "d49" = 8
extrude "Extrude10" cut sketch "Sketch12" against normal blind 3 contours A0 bodies 2
sketch "Sketch13" plane through (0, 0, 25) normal (0, 0, 1) x (-1, 0, 0)
  circle A0 centre (0, 0) radius 10.25
  dimension "d52" = 20.5
extrude "Extrude11" cut sketch "Sketch13" against normal blind 30 bodies 1 2
equation "d41 = 5.2 mm + 0.5 mm"
equation "d46 = -23 mm + 4 mm"
